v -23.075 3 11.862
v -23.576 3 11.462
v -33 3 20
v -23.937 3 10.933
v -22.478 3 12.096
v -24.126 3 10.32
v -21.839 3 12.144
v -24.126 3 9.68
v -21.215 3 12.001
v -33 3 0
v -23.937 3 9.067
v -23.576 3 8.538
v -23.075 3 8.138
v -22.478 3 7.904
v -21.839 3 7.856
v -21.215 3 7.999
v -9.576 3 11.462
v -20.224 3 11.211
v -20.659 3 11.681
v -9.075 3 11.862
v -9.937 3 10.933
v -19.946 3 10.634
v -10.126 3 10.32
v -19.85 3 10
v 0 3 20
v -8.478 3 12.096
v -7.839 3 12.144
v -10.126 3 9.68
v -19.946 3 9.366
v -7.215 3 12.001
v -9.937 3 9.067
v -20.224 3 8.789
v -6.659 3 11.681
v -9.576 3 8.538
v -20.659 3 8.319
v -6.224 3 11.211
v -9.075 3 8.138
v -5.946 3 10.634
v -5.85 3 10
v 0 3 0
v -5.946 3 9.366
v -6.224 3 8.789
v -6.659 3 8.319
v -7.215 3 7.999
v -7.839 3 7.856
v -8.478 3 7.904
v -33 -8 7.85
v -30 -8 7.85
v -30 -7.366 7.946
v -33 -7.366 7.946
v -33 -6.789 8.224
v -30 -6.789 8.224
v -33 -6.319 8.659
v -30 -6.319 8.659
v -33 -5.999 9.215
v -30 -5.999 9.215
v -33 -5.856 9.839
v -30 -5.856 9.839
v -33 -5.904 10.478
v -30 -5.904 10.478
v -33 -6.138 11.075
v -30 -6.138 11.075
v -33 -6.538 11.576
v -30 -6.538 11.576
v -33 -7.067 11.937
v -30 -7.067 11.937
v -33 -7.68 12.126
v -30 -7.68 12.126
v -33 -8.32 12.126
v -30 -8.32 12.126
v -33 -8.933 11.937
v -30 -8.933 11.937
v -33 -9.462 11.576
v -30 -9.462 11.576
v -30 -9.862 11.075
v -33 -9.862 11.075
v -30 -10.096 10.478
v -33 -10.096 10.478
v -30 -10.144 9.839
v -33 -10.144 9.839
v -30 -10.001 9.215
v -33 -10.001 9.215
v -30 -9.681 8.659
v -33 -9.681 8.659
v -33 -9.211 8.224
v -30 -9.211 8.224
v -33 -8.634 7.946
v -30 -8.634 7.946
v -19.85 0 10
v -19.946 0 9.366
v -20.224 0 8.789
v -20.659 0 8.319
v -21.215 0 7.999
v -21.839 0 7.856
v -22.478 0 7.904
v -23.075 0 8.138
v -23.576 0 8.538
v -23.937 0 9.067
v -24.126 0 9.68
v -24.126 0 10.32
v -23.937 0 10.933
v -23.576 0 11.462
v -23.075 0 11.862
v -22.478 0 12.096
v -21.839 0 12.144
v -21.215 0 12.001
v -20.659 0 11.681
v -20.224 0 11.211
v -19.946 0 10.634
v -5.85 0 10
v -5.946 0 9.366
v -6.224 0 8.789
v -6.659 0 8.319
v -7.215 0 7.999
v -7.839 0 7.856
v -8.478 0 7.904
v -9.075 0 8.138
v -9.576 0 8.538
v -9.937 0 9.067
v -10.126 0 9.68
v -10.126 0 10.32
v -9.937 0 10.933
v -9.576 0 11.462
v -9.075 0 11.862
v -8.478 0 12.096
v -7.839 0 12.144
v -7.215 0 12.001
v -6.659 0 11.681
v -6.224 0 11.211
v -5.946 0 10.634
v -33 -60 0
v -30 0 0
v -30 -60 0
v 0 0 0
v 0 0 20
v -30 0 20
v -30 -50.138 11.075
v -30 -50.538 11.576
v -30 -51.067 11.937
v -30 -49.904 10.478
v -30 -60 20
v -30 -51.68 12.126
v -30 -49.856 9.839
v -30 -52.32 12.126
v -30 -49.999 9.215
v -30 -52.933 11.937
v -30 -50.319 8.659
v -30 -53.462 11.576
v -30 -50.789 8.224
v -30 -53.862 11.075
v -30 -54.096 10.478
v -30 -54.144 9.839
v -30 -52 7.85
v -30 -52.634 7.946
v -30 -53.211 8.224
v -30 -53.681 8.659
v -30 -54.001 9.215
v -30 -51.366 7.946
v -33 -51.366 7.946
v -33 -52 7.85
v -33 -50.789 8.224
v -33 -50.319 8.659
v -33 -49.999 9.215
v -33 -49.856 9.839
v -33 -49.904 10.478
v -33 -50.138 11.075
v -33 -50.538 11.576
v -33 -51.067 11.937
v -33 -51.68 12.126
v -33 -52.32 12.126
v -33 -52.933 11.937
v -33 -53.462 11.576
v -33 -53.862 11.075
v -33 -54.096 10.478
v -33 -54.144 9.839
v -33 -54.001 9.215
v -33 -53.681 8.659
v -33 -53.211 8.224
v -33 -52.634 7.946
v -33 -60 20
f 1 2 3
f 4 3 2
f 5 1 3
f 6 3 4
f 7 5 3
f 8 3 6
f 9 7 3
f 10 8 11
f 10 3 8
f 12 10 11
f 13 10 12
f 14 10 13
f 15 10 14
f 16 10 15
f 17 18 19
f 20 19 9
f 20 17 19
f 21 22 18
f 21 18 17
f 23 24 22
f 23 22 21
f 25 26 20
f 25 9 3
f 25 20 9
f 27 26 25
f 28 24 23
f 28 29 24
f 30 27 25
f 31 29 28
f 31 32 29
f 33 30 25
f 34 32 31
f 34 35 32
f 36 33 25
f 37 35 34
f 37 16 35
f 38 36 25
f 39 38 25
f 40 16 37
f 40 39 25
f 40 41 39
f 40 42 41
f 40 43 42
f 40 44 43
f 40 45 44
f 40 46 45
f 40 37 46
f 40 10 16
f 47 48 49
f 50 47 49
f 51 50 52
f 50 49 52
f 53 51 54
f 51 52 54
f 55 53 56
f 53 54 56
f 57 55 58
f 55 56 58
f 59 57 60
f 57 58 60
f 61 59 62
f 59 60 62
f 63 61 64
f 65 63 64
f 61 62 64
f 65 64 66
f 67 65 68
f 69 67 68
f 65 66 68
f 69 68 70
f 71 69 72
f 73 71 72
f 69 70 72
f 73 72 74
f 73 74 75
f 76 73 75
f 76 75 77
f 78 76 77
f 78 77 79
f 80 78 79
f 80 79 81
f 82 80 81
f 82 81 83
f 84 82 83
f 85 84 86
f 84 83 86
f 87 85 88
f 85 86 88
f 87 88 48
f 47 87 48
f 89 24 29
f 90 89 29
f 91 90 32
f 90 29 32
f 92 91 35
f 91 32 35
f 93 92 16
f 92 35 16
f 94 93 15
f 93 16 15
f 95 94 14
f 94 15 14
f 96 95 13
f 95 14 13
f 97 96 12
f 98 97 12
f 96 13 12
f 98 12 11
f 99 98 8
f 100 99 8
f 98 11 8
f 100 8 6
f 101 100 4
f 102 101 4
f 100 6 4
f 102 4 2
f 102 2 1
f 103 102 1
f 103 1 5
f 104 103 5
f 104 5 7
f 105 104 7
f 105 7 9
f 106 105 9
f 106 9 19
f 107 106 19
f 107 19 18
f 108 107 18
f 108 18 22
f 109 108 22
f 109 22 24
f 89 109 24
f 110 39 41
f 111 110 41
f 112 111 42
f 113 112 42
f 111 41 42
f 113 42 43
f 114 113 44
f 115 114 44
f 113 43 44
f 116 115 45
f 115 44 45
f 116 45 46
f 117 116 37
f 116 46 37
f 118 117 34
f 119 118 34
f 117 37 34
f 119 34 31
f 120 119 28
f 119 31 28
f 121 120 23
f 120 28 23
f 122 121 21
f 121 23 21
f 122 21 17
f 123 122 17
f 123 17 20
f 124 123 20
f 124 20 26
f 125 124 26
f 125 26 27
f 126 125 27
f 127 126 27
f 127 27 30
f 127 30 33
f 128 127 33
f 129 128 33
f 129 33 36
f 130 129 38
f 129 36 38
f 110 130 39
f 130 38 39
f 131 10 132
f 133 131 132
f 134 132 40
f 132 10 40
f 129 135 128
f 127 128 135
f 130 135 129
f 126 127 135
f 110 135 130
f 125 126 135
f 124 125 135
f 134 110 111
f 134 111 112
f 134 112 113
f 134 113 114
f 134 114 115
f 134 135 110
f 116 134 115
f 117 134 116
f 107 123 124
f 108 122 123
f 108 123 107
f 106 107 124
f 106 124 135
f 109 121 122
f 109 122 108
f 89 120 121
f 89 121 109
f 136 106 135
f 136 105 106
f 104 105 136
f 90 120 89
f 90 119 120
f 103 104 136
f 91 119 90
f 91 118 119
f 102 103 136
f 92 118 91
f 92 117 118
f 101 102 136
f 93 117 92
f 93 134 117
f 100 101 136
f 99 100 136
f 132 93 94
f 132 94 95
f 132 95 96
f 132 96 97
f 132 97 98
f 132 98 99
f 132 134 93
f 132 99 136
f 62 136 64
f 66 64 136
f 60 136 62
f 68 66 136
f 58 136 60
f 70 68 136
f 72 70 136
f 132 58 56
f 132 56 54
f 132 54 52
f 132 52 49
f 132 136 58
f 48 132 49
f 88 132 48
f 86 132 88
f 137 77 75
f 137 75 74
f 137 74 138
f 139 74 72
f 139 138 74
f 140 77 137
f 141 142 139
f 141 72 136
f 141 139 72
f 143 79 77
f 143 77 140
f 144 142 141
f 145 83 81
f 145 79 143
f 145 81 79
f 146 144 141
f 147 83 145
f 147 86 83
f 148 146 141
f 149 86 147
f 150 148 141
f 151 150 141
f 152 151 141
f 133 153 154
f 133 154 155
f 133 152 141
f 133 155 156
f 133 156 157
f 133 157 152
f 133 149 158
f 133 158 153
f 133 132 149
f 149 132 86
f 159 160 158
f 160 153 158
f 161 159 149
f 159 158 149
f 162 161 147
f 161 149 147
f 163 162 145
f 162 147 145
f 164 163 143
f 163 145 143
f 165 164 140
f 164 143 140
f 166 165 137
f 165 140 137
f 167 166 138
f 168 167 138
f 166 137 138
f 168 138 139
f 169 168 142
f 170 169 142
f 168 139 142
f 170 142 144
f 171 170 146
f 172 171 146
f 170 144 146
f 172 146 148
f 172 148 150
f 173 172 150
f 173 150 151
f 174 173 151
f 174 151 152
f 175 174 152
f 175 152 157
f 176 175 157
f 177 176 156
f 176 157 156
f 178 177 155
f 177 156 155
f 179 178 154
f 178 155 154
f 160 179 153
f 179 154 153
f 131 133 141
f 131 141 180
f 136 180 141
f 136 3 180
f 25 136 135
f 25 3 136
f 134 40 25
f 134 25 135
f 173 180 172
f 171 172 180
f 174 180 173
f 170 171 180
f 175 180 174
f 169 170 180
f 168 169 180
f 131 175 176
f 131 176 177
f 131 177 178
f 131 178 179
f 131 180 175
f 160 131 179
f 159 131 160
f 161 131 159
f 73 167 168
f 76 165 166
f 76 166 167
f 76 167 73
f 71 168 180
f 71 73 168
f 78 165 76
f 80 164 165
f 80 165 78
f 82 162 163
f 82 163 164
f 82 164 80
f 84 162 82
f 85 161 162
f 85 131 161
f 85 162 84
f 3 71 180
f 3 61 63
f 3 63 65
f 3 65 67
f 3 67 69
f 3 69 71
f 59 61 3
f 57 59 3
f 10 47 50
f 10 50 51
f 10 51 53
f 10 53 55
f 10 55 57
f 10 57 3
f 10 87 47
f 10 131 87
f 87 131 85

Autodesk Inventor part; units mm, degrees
ref_plane "YZ Plane" through (0, 0, 0) normal (1, 0, 0) x (0, 1, 0)
ref_plane "XZ Plane" through (0, 0, 0) normal (0, 1, 0) x (-1, 0, 0)
sketch "Sketch1" plane through (0, 0, 0) normal (0, 0, 1) x (1, 0, 0)
  line L0 (0, 0) -> (-30, 0)
  line L1 (-30, 0) -> (-30, -60)
  line L2 (0, 0) -> (-30, 0)
  line L3 (-30, 0) -> (-30, 3)
  line L4 (-30, 3) -> (0, 3)
  line L5 (0, 3) -> (0, 0)
  line L6 (-30, -60) -> (-33, -60)
  line L7 (-33, -60) -> (-33, 0)
  line L8 (-33, 0) -> (-30, 0)
  line L9 (-30, 0) -> (-30, -60)
  line L10 (-30, 3) -> (-33, 3)
  line L11 (-33, 3) -> (-33, 0)
  line L12 (-33, 0) -> (-30, 0)
  line L13 (-30, 0) -> (-30, 3)
  dimension "d0" = 30
  dimension "d1" = 60
  dimension "d2" = 3
  dimension "d3" = 3
extrude "Extrusion1" add sketch "Sketch1" along normal blind 20
sketch "Sketch2" plane through (-30, -60, 0) normal (1, 0, 0) x (0, 0, -1)
  line L0 (0, 63) -> (0, 0) projected
  line L1 (-20, 63) -> (-20, 0) projected
  line L2 (0, 0) -> (-20, 0)
  line L3 (-20, 0) -> (-20, 60)
  line L4 (-20, 60) -> (0, 60)
  line L5 (0, 60) -> (0, 0)
  line L6 (-10, 0) -> (-10, 8)
  line L7 (-10, 60) -> (-10, 52)
  circle A0 centre (-10, 52) radius 2.15
  circle A1 centre (-10, 8) radius 2.15
  dimension "d6" = 8
  dimension "d7" = 8
  dimension "d8" = 4.3
  dimension "d9" = 4.3
extrude "Extrusion2" cut sketch "Sketch2" against normal through all contours A0 | A1
sketch "Sketch3" plane through (-33, 3, 0) normal (0, 1, 0) x (1, 0, 0)
  line L0 (33, -20) -> (0, -20) projected
  line L1 (3, 0) -> (3, -20) projected
  line L2 (33, -20) -> (3, -20)
  line L3 (3, -20) -> (3, 0)
  line L4 (3, 0) -> (33, 0)
  line L5 (33, 0) -> (33, -20)
  line L6 (33, -10) -> (25, -10)
  line L7 (3, -10) -> (11, -10)
  circle A0 centre (11, -10) radius 2.15
  circle A1 centre (25, -10) radius 2.15
  dimension "d12" = 8
  dimension "d13" = 8
  dimension "d14" = 4.3
  dimension "d15" = 4.3
extrude "Extrusion3" cut sketch "Sketch3" against normal through all contours A1 | A0
ref_plane "Work Plane1" through (0, 0, 10) normal (0, 0, 1) x (1, 0, 0)
properties part number "BedBeltMount1"
